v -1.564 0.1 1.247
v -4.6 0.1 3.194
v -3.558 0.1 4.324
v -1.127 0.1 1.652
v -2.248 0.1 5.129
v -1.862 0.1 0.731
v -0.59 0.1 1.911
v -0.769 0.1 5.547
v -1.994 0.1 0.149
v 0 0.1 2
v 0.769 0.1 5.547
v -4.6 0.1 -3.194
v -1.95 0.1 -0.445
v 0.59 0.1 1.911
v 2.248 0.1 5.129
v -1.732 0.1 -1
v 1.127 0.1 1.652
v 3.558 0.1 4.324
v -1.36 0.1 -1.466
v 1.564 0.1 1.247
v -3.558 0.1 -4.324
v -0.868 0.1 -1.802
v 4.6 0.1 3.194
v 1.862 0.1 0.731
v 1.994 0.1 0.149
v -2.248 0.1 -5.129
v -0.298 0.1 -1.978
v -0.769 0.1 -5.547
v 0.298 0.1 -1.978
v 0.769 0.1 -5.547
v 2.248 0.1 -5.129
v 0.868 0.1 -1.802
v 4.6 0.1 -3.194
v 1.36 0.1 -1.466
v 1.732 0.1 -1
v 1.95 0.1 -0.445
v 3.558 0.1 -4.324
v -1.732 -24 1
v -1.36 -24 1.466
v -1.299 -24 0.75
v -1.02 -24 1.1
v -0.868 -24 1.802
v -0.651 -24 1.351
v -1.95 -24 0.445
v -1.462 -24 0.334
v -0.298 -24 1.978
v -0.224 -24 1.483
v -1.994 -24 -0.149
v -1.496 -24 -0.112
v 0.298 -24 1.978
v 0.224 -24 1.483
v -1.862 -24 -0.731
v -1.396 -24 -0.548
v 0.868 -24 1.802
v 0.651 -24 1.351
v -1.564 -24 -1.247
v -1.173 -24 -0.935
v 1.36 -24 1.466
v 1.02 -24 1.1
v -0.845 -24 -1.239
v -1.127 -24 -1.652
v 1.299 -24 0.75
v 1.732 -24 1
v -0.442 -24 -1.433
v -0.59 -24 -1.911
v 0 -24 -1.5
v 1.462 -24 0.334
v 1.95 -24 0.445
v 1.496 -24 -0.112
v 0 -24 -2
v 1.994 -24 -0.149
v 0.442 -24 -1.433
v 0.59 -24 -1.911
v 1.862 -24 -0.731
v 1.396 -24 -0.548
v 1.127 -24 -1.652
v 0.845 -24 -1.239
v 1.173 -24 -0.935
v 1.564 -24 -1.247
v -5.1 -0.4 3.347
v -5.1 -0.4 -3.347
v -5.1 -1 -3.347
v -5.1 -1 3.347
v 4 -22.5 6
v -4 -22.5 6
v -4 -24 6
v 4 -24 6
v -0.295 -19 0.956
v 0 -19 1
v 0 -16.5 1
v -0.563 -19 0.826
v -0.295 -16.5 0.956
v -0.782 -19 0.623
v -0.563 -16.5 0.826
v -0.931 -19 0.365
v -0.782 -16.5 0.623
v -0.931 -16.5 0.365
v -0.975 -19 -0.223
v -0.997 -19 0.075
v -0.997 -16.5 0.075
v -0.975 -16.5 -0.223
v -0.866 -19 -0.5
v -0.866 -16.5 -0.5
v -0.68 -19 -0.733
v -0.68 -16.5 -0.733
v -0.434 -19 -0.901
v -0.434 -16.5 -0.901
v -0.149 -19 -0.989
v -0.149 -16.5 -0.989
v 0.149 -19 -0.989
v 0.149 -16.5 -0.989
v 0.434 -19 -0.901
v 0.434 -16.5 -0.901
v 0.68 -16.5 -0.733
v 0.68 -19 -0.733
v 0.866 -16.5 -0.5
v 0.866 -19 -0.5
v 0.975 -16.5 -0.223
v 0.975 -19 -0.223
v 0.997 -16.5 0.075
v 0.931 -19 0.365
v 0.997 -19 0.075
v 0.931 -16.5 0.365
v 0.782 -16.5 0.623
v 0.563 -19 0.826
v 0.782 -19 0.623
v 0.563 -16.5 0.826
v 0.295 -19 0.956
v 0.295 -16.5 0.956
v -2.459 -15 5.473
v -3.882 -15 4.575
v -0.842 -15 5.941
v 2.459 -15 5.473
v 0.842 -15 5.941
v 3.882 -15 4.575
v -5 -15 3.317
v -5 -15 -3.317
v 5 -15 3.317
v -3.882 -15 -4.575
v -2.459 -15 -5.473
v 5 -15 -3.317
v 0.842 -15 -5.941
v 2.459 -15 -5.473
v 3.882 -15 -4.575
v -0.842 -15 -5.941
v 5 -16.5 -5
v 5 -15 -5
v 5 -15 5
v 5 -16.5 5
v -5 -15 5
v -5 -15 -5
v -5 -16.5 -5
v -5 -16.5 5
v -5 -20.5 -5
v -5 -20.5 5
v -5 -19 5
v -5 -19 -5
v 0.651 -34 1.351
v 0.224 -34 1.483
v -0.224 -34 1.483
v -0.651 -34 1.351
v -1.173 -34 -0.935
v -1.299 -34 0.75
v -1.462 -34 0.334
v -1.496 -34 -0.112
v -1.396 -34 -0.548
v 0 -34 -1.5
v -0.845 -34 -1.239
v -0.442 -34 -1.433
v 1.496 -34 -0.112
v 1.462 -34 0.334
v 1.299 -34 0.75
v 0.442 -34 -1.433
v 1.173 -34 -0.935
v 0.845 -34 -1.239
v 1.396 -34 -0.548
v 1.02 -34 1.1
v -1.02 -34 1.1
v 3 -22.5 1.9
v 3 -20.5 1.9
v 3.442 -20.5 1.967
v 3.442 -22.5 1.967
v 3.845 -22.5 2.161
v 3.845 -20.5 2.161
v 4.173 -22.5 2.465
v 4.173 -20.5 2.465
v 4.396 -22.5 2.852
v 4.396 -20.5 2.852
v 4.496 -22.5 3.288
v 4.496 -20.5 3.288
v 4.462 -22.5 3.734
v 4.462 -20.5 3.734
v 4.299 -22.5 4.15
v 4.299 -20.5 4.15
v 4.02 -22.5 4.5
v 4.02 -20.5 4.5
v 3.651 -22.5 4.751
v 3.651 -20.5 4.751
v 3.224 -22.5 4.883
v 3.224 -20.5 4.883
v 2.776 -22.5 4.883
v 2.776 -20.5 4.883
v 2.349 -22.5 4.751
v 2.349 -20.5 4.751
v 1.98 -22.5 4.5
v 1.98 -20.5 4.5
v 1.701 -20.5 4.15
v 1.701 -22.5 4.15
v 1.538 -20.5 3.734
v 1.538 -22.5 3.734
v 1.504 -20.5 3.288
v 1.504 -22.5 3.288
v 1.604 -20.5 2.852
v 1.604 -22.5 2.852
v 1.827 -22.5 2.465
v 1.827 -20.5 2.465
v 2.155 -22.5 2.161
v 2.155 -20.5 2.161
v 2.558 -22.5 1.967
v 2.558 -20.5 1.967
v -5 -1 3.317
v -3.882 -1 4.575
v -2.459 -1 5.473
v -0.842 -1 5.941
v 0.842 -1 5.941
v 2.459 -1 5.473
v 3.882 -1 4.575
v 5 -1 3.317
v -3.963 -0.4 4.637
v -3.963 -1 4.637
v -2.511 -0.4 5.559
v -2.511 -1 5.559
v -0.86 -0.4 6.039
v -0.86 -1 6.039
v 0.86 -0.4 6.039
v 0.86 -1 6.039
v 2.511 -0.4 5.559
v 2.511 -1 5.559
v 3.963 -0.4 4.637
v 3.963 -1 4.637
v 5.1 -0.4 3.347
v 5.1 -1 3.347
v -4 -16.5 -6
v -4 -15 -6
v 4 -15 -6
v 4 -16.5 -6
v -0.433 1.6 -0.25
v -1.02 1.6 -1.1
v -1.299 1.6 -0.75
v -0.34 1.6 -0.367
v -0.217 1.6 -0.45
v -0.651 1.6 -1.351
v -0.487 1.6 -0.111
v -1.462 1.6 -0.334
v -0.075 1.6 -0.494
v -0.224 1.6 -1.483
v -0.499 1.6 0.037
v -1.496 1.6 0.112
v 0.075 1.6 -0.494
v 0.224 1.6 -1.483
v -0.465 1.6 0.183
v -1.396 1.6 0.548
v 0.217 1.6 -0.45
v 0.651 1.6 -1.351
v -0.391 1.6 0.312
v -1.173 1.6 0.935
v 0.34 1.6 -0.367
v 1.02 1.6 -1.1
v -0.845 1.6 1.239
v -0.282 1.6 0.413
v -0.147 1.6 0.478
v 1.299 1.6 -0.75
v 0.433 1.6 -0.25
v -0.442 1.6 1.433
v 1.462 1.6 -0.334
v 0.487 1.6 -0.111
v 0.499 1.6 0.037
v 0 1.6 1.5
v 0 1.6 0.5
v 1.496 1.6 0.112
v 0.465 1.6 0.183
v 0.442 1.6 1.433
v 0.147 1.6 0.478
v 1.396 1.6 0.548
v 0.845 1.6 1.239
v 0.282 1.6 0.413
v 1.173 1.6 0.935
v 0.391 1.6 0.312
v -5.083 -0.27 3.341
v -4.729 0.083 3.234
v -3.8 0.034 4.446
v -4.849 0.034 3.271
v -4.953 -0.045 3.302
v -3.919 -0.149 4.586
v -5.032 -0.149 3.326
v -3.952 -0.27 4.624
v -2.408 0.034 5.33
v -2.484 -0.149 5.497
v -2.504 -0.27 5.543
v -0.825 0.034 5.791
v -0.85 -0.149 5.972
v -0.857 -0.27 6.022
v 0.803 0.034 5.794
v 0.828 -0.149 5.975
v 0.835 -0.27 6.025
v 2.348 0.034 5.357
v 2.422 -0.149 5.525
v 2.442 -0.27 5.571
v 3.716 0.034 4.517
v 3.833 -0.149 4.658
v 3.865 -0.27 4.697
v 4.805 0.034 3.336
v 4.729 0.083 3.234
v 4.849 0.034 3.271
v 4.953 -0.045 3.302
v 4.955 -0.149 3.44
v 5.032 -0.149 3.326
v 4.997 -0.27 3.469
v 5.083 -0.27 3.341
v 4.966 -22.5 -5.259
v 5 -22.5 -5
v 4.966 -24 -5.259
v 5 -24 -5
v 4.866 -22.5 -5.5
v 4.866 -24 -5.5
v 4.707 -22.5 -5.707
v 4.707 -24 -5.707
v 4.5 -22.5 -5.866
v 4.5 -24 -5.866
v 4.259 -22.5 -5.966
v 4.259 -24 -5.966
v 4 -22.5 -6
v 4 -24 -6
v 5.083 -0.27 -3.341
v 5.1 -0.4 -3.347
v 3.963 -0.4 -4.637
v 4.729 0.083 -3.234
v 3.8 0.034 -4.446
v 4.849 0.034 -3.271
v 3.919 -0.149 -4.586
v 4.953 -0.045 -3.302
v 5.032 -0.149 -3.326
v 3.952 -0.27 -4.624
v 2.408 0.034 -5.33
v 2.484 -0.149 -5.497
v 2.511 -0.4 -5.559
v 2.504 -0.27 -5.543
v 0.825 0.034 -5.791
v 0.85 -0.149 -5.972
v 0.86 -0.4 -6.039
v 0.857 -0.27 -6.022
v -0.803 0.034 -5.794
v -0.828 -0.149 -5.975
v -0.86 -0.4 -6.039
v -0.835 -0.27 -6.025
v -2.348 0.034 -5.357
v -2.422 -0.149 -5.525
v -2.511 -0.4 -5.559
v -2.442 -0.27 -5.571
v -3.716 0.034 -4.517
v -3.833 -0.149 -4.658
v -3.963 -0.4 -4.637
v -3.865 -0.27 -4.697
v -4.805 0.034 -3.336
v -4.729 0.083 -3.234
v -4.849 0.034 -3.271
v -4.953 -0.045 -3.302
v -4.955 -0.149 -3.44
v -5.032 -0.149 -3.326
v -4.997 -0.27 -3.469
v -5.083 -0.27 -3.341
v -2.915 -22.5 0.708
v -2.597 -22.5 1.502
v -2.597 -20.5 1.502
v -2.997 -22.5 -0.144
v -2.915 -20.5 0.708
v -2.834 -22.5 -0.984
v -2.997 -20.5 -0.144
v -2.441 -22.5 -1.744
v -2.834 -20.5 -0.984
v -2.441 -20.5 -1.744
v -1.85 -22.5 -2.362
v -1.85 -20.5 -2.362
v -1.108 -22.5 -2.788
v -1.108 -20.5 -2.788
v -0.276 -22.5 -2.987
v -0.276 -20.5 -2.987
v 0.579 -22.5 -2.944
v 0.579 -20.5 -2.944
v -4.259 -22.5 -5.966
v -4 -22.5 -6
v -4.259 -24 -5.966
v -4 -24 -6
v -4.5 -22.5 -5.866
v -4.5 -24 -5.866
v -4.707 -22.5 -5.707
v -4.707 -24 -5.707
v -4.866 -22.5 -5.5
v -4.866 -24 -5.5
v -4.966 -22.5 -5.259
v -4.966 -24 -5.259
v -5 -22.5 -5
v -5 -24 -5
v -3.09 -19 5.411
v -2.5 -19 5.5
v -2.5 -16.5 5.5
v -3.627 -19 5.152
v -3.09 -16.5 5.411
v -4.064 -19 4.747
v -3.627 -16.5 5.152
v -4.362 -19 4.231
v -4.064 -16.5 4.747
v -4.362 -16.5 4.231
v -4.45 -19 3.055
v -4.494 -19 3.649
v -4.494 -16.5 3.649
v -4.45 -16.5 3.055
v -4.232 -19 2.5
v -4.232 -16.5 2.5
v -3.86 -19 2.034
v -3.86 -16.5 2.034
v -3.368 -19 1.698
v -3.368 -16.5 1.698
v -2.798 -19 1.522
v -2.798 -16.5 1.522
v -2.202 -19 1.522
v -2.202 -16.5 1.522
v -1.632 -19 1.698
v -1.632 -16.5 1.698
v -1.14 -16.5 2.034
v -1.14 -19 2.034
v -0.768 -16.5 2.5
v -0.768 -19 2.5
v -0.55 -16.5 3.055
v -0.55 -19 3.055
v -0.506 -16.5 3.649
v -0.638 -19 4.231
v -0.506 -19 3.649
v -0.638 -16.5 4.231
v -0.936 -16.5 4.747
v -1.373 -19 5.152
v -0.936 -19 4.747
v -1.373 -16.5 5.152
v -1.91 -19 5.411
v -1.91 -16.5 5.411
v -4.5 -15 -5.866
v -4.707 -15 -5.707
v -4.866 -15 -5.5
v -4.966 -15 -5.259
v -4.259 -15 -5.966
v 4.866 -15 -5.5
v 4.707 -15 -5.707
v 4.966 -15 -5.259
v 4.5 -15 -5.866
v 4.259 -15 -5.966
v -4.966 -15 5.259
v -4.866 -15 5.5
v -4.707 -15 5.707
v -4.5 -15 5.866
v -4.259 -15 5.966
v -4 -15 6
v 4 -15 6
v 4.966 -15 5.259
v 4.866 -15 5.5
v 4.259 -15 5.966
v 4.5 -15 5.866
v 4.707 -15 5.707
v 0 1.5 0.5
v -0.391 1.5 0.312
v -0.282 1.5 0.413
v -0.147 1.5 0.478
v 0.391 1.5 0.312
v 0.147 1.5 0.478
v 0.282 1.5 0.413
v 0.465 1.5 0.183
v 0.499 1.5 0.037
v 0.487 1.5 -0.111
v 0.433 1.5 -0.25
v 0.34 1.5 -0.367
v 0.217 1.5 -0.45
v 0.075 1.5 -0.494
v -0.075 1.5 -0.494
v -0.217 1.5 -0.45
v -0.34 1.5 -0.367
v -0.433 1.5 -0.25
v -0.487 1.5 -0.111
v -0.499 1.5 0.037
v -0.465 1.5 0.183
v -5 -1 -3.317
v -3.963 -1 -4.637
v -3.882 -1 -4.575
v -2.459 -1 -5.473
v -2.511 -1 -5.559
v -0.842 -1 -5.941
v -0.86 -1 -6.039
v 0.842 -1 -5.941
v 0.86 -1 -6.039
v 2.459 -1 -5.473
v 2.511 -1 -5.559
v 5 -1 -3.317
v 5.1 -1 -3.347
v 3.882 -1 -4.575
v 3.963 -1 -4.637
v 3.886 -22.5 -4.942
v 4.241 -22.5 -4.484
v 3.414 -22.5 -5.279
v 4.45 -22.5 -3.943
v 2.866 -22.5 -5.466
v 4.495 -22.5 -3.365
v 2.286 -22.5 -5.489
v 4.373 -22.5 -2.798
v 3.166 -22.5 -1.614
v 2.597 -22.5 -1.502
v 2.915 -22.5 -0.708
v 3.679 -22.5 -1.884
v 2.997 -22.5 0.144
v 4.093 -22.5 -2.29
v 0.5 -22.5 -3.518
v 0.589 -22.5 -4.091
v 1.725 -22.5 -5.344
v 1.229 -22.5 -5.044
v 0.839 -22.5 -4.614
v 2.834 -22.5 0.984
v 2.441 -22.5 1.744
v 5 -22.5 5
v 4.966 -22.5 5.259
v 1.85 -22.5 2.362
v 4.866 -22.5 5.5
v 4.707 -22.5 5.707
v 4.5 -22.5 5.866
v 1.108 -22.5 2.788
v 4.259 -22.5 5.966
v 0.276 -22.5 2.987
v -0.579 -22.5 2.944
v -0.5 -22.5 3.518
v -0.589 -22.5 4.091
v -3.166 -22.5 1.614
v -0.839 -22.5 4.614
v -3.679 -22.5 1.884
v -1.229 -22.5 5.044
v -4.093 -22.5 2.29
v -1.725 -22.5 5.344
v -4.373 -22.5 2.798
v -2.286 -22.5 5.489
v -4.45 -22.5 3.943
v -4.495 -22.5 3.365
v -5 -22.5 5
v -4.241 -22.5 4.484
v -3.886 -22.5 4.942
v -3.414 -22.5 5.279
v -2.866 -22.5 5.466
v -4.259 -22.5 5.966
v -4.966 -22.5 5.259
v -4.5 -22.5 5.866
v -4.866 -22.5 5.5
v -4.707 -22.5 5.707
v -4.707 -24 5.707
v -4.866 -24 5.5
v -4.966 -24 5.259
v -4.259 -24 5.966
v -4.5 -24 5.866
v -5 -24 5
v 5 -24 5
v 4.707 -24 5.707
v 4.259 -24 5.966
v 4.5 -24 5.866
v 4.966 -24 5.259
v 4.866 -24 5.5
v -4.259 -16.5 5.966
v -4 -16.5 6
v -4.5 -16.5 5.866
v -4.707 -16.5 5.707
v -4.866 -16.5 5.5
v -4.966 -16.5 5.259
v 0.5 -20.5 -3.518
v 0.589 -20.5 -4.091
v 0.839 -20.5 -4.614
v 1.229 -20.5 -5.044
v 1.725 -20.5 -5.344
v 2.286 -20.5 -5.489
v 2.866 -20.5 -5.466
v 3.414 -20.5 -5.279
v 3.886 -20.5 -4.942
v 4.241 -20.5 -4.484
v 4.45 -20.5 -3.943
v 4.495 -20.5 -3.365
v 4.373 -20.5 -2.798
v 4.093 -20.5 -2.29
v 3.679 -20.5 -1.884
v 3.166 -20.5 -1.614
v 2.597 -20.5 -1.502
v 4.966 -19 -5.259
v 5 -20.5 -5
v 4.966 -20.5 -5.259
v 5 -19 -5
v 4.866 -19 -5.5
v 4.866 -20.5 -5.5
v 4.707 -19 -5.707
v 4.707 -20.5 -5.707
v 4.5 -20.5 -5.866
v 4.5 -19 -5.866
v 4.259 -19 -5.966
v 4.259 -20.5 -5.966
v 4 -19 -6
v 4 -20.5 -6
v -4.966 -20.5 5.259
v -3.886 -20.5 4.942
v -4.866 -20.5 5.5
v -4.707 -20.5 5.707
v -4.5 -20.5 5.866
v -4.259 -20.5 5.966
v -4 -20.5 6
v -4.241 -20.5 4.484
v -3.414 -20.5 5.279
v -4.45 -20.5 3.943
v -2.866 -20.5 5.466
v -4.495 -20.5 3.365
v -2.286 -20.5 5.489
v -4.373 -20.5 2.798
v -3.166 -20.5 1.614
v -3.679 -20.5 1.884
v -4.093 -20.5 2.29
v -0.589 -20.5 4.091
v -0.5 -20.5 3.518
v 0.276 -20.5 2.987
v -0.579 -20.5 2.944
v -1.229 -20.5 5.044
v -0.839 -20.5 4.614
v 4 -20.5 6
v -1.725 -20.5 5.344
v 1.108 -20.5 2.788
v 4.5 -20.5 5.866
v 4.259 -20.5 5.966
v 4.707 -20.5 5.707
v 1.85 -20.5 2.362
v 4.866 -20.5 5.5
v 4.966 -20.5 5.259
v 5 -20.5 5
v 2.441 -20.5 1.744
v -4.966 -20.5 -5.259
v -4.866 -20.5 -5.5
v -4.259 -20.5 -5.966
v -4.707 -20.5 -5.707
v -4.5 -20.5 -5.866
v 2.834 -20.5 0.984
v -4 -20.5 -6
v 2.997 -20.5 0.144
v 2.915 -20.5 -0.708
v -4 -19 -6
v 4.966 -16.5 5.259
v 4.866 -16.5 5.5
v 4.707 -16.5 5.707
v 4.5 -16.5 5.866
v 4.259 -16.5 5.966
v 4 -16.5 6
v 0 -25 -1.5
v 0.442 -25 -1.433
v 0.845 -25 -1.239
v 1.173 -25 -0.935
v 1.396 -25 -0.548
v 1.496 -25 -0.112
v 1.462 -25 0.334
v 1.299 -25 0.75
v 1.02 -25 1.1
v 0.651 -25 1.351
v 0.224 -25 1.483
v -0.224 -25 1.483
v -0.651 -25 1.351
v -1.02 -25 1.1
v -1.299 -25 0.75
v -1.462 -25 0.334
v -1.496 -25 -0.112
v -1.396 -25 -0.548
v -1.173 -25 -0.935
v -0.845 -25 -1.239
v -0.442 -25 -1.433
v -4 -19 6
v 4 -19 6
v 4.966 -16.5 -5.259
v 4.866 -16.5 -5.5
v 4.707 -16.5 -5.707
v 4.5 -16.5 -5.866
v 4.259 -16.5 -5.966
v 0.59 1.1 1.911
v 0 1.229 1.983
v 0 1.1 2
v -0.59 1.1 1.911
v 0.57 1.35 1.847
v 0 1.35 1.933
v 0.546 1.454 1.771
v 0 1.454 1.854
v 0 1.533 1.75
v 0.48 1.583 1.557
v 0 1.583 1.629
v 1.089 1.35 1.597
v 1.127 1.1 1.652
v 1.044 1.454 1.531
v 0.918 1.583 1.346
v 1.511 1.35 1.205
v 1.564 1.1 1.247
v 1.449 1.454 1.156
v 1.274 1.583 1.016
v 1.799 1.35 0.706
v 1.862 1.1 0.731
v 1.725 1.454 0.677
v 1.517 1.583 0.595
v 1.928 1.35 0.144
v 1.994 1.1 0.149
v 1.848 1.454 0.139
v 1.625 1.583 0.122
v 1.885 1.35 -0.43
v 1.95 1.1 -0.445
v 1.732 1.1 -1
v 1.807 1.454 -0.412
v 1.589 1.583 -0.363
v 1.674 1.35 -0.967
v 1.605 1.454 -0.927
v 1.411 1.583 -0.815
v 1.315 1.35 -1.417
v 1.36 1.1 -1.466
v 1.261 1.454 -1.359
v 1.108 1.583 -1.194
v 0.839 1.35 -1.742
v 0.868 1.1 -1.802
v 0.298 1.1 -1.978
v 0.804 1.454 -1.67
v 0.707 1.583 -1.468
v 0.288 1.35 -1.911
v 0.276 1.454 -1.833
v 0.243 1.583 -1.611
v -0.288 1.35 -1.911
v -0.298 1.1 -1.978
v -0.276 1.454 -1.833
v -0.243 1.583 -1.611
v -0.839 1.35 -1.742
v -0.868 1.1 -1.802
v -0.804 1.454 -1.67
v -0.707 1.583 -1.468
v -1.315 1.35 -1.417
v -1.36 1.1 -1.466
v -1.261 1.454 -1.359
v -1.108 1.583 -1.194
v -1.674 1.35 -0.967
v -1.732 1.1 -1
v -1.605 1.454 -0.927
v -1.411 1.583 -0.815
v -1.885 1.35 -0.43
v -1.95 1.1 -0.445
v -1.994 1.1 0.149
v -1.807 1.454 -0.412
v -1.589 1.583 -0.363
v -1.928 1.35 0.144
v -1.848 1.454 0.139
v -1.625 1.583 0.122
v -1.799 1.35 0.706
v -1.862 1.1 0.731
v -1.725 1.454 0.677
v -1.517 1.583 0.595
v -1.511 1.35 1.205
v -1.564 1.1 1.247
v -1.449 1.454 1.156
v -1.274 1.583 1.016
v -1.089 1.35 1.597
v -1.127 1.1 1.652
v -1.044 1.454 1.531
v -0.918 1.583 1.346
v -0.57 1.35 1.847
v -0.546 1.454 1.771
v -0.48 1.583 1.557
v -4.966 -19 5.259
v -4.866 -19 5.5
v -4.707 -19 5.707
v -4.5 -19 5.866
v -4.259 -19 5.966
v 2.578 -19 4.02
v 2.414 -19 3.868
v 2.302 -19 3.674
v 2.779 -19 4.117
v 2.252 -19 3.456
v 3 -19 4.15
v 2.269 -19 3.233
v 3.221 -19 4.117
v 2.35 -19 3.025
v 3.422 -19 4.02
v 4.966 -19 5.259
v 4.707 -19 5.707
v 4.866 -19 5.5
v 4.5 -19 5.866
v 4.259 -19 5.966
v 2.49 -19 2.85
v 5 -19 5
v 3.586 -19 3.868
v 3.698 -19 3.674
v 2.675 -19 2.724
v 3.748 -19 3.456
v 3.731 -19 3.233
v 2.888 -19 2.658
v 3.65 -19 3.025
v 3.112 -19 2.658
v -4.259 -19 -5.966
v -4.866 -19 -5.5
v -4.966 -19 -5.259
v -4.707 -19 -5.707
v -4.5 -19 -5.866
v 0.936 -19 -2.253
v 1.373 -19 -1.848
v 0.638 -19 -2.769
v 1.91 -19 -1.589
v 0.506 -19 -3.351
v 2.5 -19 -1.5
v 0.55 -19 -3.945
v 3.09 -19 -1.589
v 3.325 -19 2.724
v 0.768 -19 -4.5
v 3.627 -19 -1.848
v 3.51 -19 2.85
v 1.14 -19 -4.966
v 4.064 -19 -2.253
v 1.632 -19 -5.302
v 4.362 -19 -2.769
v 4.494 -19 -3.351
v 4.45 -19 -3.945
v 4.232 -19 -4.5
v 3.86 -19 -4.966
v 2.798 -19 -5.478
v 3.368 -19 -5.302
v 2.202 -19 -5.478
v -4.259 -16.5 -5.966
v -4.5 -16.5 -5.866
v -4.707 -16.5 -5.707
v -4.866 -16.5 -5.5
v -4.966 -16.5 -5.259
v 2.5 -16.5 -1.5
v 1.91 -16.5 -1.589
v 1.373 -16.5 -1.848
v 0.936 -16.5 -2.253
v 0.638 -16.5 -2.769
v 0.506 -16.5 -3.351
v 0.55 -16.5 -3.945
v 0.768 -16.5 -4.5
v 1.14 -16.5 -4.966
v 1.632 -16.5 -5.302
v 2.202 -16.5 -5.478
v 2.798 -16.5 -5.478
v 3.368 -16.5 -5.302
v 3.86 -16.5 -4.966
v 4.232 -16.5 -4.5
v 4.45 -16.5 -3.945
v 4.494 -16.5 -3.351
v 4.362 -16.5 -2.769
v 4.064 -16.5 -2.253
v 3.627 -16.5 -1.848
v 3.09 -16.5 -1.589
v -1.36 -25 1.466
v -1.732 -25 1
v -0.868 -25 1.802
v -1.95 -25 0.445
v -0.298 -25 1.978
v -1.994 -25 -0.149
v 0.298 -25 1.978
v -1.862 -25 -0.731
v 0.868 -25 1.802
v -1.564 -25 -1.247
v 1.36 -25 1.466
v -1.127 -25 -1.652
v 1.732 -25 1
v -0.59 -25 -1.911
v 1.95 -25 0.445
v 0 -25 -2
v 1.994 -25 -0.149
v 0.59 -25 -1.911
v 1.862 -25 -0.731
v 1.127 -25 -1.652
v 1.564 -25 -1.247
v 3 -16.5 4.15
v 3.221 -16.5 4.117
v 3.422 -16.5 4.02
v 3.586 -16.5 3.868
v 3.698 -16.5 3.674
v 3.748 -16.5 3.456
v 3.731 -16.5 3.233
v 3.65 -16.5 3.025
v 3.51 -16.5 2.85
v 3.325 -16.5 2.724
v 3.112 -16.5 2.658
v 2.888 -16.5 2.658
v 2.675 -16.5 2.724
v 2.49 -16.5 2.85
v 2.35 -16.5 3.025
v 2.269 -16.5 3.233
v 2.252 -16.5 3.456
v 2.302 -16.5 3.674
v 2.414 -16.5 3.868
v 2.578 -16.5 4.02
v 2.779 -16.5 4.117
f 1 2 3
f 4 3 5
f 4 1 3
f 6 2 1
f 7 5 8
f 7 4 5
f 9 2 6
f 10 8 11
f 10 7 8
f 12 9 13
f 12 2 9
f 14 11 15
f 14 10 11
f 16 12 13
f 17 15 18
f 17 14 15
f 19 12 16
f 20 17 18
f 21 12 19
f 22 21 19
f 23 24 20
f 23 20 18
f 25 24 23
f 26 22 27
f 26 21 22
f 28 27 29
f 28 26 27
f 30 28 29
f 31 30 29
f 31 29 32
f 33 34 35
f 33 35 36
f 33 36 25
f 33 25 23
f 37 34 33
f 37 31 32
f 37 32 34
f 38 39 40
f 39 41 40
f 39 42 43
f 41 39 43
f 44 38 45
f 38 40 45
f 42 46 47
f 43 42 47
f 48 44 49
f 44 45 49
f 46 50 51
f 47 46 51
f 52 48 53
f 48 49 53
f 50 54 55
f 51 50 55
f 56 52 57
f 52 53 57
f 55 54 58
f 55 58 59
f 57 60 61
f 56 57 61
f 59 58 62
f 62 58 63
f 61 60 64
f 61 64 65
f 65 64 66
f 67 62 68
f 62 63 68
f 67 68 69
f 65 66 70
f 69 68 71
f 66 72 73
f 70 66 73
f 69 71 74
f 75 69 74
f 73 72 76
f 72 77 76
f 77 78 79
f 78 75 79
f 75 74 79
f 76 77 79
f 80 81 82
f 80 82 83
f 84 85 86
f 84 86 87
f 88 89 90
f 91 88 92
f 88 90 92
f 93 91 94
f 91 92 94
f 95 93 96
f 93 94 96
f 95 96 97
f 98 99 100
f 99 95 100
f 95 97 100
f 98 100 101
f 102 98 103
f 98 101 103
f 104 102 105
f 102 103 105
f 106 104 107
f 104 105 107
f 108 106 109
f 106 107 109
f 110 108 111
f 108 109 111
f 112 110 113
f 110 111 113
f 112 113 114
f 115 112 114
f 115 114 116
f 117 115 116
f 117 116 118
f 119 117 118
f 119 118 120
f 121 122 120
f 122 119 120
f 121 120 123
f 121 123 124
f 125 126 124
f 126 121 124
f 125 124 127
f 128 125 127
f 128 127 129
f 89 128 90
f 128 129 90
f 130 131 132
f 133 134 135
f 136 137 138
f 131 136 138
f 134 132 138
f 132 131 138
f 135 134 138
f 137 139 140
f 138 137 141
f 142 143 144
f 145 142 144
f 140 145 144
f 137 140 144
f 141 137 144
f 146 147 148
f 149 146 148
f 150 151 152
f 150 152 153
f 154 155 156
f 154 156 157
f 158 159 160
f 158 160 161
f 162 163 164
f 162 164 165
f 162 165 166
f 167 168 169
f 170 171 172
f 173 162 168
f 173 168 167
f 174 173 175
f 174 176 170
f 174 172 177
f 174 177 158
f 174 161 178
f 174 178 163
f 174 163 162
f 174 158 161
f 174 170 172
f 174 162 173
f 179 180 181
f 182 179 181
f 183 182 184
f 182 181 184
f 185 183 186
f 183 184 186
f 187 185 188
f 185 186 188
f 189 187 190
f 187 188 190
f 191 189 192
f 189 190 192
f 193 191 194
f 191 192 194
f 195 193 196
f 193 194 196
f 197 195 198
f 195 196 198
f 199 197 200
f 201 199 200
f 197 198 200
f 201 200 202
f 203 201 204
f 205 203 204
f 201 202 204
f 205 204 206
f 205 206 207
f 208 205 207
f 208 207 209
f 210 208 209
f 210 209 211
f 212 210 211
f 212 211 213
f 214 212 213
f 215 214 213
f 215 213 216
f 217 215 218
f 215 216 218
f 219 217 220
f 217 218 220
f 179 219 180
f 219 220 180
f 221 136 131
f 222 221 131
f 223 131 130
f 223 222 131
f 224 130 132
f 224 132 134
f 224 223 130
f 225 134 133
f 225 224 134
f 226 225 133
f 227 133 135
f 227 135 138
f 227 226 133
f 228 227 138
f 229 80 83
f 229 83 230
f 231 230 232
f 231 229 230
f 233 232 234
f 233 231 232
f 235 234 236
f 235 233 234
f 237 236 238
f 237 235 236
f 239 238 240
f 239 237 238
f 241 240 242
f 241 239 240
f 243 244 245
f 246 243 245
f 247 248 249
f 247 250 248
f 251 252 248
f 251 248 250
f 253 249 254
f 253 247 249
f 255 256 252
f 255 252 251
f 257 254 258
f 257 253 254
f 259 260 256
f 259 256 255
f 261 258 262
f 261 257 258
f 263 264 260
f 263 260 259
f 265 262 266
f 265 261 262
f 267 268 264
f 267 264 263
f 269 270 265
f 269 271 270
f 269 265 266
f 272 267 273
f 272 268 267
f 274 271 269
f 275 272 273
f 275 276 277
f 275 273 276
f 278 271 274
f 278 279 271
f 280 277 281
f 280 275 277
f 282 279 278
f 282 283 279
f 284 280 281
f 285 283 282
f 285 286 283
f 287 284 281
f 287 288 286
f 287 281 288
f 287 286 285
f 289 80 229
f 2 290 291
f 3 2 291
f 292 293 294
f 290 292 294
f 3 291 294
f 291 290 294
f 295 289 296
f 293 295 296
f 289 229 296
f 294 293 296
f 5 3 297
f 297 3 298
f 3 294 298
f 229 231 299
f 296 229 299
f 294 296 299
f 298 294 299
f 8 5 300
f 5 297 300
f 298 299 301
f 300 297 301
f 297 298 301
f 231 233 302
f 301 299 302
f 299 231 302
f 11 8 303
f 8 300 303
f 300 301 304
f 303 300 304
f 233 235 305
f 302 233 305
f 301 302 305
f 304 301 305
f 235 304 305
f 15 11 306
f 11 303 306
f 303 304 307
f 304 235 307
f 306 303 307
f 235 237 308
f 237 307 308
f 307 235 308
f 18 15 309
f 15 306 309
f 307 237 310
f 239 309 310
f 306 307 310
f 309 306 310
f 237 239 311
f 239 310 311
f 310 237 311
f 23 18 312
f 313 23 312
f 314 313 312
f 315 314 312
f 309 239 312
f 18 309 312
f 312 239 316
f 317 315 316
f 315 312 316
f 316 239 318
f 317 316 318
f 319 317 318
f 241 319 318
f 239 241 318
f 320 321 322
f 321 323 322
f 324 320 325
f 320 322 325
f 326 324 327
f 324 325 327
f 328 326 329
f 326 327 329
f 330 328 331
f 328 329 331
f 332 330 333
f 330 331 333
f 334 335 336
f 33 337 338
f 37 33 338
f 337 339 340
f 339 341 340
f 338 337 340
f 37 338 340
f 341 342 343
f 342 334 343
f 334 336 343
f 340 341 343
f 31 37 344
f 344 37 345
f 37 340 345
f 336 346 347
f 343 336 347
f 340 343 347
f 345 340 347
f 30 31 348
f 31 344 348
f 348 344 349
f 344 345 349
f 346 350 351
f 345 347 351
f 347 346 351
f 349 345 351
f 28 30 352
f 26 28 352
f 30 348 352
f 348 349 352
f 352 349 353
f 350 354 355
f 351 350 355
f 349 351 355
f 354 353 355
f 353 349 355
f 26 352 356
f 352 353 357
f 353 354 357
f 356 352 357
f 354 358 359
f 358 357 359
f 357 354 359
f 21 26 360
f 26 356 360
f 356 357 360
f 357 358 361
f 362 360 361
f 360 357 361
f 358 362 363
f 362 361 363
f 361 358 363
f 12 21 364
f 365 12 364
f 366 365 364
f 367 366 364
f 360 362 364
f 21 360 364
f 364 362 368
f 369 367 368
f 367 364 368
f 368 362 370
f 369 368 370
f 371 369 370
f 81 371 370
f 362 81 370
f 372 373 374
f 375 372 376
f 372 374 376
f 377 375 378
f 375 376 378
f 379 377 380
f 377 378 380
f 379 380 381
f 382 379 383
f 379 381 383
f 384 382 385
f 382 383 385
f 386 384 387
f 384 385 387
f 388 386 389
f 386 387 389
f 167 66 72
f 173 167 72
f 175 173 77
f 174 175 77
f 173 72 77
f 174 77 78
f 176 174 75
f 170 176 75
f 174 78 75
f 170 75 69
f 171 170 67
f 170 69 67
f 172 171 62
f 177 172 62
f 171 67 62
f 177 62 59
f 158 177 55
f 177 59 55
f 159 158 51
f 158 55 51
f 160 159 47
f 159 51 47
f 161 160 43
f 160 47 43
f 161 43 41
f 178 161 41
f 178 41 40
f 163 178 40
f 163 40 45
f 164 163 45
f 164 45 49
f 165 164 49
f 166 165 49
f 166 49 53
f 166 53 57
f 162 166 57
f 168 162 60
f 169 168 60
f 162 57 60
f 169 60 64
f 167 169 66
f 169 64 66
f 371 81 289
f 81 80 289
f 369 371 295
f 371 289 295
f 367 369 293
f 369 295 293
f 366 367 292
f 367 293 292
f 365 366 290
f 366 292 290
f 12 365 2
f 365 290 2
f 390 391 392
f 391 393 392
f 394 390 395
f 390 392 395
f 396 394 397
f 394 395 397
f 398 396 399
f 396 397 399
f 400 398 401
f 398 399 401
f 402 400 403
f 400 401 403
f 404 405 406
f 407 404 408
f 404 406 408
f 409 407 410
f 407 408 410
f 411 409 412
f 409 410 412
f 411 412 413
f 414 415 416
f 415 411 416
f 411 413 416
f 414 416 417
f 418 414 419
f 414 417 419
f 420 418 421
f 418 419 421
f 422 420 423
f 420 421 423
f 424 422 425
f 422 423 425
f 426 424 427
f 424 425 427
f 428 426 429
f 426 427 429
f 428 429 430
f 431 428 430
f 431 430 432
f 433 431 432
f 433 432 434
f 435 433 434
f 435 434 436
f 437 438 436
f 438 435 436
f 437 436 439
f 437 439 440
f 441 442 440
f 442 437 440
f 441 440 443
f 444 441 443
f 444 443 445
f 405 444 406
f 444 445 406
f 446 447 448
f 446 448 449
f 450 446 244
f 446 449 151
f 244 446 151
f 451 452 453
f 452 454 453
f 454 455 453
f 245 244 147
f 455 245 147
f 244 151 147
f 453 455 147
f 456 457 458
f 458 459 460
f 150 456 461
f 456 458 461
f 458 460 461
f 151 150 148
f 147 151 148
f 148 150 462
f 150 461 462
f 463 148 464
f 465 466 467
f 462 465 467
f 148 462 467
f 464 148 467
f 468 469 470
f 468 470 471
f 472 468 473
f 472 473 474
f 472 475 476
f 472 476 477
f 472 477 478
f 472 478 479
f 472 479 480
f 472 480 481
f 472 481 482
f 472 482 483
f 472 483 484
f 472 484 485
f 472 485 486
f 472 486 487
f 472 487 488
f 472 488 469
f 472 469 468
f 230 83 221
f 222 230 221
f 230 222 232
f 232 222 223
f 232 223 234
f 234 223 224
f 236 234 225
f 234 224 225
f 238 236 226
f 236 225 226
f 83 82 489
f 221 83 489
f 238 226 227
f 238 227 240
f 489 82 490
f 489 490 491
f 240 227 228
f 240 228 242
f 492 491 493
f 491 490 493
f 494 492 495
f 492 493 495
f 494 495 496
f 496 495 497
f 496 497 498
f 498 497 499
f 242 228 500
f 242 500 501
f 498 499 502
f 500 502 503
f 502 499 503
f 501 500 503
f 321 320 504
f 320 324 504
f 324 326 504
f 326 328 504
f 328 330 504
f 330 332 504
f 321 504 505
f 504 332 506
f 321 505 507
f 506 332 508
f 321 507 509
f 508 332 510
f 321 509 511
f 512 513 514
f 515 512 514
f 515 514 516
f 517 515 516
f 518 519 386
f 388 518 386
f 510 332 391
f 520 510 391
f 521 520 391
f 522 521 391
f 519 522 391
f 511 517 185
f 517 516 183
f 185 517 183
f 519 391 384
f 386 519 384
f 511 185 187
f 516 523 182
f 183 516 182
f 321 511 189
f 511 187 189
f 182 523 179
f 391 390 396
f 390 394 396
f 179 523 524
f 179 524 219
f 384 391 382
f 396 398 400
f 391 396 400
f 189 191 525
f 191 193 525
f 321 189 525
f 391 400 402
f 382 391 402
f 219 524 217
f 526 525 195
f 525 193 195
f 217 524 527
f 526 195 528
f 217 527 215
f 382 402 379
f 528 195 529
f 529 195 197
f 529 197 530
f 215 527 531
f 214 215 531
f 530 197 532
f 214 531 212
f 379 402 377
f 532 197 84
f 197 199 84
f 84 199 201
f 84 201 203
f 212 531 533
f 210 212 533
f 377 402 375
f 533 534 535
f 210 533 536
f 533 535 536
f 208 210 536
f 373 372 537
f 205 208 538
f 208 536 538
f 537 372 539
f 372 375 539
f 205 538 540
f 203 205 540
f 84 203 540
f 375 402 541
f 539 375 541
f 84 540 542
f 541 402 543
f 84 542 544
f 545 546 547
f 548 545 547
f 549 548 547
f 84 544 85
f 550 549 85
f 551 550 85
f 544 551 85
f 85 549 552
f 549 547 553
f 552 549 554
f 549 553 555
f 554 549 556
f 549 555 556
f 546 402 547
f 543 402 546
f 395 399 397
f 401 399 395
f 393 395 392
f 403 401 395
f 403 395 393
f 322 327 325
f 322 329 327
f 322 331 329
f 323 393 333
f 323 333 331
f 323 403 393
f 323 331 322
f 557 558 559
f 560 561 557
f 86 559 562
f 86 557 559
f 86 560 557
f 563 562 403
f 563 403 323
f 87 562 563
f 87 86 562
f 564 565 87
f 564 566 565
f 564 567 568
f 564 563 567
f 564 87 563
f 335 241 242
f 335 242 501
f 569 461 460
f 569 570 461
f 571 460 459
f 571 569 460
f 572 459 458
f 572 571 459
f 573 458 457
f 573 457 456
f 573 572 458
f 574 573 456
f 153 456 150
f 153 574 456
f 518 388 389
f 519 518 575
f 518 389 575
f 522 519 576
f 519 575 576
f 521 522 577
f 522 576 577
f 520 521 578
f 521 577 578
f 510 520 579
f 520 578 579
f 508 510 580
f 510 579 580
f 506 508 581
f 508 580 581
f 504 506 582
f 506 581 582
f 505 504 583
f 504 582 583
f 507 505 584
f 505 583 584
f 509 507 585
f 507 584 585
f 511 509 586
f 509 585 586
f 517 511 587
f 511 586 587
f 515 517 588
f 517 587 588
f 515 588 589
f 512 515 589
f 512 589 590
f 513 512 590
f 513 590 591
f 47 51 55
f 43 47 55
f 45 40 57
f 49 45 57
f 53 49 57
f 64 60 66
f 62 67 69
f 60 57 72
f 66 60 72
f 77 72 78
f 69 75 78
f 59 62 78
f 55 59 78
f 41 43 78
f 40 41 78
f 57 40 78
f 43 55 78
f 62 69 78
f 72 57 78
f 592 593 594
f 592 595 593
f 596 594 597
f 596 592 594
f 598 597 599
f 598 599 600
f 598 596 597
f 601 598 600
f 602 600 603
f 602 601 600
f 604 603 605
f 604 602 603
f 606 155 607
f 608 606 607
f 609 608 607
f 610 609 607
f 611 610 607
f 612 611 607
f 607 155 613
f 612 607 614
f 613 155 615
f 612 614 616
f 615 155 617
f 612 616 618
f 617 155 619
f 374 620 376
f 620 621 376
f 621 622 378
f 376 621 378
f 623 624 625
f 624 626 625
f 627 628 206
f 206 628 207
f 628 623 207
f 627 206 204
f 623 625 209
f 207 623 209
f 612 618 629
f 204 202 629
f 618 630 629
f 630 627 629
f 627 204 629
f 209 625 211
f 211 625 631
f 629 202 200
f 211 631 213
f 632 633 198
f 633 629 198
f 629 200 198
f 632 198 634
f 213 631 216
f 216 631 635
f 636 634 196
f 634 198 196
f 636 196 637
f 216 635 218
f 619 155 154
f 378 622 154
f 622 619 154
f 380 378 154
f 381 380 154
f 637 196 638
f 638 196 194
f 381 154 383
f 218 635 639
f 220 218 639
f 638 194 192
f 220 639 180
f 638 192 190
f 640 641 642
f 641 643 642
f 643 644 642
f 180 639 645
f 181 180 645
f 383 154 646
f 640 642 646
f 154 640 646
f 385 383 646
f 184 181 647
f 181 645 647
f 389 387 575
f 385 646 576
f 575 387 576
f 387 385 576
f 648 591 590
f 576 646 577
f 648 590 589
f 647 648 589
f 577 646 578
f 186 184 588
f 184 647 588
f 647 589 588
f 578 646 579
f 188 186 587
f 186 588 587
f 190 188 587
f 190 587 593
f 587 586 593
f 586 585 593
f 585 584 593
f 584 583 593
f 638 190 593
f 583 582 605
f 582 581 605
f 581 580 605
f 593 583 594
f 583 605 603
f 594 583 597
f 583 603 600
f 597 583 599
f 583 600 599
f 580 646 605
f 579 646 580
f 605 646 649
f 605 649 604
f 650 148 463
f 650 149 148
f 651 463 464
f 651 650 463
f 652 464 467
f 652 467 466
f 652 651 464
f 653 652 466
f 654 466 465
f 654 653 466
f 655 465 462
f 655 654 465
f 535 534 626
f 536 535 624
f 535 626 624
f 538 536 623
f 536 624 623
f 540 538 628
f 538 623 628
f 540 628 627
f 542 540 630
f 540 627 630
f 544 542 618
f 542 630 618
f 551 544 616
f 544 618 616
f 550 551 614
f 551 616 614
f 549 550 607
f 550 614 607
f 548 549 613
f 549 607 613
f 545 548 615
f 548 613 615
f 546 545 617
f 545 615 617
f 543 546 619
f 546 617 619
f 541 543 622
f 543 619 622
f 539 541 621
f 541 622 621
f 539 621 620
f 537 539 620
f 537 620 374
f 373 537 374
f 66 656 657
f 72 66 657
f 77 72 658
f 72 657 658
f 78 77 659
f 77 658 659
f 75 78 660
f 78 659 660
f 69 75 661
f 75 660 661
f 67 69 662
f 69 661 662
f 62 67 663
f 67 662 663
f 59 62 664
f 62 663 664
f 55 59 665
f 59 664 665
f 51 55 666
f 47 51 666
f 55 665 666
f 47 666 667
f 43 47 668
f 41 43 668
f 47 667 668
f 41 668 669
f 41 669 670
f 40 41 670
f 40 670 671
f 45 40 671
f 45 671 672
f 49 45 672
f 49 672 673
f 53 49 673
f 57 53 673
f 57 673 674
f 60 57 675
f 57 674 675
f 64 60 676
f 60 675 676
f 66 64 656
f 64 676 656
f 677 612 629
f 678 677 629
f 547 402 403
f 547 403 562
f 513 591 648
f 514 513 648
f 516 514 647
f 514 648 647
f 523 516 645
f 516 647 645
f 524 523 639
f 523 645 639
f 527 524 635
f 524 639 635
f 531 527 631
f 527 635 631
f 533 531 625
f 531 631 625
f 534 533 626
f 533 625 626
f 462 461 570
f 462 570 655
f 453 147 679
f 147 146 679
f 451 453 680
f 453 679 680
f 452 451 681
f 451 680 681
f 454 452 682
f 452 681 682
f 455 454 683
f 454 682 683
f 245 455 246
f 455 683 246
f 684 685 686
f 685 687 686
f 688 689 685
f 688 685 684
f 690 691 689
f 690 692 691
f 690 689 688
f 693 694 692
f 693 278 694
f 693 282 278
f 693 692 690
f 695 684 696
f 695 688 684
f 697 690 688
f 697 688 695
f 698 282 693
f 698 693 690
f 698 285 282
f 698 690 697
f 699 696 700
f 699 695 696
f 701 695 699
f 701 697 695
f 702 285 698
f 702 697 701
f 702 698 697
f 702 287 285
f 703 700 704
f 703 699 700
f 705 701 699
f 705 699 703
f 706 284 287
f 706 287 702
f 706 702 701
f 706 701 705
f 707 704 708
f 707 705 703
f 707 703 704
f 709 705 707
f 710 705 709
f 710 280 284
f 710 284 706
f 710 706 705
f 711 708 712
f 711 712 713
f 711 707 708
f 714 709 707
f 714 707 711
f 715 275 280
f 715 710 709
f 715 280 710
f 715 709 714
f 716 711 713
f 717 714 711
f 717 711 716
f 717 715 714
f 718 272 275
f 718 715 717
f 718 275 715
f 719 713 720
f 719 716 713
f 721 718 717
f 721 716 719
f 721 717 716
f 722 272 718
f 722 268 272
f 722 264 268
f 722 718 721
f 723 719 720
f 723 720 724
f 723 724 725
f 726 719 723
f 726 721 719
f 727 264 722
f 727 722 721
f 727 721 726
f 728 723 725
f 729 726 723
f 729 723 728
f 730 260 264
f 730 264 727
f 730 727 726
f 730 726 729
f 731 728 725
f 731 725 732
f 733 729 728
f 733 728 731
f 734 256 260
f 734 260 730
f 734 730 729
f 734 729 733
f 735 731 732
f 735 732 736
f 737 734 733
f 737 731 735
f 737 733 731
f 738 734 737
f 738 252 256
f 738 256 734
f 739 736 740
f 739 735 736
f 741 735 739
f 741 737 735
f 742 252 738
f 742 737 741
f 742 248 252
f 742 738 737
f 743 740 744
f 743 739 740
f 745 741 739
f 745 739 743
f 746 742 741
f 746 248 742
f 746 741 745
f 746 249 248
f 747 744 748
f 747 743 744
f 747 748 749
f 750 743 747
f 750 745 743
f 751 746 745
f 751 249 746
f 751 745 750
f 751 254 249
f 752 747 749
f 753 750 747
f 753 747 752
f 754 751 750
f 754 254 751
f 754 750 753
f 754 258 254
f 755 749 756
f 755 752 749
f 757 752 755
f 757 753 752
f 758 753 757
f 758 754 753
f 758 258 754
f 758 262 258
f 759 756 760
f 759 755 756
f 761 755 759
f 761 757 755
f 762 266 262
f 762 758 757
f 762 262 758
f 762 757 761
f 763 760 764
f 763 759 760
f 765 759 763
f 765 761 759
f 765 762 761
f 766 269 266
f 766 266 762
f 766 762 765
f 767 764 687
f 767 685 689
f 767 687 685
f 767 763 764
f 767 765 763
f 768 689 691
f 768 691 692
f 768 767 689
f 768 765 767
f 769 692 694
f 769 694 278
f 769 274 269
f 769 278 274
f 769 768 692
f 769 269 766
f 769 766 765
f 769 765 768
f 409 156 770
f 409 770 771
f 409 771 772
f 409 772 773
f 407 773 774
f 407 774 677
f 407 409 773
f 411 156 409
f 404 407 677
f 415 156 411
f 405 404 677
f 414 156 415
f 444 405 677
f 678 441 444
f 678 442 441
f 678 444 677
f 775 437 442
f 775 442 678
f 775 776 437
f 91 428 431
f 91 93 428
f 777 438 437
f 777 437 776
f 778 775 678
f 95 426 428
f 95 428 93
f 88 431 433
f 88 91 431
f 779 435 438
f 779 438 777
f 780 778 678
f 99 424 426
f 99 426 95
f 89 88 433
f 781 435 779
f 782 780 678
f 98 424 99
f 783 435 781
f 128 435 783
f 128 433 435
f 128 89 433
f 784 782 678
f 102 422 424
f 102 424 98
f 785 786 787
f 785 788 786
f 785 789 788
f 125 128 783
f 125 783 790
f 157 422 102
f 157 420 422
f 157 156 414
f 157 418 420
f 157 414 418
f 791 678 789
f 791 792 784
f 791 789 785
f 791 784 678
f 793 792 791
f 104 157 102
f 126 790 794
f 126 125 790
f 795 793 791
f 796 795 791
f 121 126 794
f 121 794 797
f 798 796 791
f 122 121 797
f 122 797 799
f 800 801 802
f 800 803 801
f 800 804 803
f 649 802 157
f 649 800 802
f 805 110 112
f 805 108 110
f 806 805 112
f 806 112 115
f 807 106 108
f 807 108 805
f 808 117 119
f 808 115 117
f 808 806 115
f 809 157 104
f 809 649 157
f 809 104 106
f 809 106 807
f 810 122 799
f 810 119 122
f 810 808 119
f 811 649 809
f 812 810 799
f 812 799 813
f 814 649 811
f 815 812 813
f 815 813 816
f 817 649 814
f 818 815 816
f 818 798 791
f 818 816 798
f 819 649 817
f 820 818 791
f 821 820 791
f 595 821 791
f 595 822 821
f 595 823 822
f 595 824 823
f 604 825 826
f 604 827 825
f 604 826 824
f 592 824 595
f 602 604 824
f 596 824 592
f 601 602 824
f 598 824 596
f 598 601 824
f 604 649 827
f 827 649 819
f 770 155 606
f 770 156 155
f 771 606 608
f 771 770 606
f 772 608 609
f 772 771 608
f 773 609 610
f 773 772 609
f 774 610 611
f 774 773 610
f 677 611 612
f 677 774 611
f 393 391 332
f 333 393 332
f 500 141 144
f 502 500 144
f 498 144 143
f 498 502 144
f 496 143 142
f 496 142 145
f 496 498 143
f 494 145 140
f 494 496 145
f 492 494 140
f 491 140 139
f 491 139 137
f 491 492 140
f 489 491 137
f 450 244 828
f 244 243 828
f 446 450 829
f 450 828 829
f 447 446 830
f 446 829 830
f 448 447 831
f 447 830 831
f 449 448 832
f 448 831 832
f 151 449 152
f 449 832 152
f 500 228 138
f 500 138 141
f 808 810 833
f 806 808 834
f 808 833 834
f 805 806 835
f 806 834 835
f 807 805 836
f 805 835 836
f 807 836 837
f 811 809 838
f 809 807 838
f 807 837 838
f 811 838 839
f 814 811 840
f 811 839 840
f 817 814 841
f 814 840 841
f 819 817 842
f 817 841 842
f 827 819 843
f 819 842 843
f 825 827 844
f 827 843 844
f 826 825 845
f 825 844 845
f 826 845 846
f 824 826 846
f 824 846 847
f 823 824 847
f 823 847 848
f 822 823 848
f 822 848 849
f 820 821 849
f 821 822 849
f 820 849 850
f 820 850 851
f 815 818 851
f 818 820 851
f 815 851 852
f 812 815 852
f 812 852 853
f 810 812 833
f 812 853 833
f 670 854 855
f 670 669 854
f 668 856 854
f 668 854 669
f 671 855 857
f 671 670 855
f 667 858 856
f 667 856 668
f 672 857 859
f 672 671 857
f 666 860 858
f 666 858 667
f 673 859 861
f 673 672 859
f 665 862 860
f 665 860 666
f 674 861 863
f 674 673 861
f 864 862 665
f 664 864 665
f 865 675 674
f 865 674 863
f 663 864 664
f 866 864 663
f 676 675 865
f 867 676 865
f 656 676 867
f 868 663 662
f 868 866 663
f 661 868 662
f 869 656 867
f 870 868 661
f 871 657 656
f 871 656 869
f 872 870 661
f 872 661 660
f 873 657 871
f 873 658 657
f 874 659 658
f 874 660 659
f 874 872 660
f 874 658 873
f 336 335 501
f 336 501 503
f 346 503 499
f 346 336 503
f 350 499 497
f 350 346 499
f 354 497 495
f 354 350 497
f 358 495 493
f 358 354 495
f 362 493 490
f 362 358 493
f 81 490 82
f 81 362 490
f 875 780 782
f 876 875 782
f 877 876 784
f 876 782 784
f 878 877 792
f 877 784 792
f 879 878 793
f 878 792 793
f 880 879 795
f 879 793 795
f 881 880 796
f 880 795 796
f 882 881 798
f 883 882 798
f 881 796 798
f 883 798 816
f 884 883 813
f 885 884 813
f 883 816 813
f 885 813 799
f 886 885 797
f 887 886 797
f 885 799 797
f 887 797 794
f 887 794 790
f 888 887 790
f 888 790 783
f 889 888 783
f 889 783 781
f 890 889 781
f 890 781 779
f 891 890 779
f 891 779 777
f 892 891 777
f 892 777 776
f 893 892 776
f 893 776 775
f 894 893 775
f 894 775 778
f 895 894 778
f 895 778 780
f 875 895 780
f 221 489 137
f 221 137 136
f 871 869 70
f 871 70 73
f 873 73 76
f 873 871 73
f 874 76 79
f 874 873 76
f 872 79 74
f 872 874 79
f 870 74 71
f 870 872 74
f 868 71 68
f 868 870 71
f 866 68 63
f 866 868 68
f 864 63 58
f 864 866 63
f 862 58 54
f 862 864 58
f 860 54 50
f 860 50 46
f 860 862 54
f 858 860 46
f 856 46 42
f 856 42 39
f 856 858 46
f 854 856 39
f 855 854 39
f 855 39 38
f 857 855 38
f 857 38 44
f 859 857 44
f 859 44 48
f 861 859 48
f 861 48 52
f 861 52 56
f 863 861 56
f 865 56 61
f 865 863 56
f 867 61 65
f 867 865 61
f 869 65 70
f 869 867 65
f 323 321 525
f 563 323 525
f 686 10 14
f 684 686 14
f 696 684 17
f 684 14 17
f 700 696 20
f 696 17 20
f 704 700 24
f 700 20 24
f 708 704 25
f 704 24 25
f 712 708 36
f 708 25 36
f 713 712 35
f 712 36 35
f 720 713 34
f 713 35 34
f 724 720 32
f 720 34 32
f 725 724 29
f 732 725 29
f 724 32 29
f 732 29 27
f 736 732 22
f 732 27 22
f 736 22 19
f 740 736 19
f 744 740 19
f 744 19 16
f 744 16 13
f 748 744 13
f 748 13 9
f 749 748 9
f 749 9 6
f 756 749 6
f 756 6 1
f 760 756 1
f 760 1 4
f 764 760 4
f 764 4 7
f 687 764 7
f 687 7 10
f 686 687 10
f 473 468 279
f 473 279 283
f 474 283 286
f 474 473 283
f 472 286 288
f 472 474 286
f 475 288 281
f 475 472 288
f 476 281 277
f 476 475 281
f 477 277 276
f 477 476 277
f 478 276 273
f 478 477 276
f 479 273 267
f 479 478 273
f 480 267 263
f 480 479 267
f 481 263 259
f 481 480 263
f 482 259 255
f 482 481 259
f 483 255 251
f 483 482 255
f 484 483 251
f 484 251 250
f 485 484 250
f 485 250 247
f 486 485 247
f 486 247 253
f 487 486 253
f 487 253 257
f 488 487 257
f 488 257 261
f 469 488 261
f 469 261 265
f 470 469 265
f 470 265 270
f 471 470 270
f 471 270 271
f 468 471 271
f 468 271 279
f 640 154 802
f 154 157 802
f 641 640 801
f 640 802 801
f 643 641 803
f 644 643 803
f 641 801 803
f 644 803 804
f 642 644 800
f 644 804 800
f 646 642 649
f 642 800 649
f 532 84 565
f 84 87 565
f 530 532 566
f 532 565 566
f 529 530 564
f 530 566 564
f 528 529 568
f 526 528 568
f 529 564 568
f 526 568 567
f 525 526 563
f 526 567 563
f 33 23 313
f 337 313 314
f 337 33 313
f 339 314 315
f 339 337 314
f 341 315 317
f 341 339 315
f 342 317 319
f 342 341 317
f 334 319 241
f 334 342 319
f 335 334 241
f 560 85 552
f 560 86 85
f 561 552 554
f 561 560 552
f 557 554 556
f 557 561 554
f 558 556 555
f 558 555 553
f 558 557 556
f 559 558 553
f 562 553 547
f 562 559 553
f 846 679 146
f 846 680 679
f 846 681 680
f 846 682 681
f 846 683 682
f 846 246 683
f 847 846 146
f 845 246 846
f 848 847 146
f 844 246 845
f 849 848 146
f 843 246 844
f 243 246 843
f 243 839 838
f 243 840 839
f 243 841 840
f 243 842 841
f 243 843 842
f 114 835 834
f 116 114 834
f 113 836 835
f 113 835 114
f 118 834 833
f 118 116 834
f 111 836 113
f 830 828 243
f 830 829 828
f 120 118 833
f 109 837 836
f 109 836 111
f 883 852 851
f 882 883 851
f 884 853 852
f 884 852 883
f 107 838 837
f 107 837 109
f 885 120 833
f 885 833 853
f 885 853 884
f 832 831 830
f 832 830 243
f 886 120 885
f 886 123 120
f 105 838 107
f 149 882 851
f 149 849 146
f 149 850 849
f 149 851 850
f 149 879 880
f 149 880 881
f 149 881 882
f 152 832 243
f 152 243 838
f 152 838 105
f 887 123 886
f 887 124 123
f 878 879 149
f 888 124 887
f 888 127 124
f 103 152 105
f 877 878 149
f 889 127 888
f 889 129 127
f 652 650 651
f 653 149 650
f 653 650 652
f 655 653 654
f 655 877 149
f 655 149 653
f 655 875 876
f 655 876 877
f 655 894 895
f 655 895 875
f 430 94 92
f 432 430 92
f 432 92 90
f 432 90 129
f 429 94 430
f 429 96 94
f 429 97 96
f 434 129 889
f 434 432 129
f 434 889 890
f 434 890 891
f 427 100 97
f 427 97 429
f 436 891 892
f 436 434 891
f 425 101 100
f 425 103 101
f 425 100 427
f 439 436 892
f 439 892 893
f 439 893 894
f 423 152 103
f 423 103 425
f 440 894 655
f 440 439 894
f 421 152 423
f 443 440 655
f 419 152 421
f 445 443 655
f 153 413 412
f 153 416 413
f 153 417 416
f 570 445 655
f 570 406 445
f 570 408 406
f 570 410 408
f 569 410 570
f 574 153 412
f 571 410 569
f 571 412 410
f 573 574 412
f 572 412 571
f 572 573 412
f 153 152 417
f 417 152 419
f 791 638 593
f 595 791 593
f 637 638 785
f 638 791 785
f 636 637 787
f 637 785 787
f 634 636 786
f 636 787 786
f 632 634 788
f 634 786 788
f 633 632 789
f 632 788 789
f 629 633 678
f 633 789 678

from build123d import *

# Parameters (mm, degrees)
EXTRUDE_1_DEPTH     = 15
SKETCH_2_R          = 2
SKETCH_2_R_2        = 0.5
EXTRUDE_2_DEPTH     = 1.6
SKETCH_3_R          = 0.5
EXTRUDE_3_DEPTH     = 1.5
SKETCH_4_W          = 10
SKETCH_4_H          = 12
EXTRUDE_4_DEPTH     = 9
SKETCH_5_R          = 1.5
EXTRUDE_5_DEPTH     = 10
EXTRUDE_START       = 1
SKETCH_6_R          = 2
SKETCH_6_R_2        = 1.5
EXTRUDE_6_DEPTH     = 1
SKETCH_7_W          = 12
SKETCH_7_H          = 6
CUT_EXTRUDE_1_DEPTH = 20
SKETCH_8_R          = 1
SKETCH_8_R_2        = 2
EXTRUDE_7_DEPTH     = 7
SKETCH_10_R         = 3
SKETCH_10_R_2       = 1.5
EXTRUDE_8_DEPTH     = 2
SKETCH_11_R         = 0.75
EXTRUDE_9_DEPTH     = 4
EXTRUDE_10_DEPTH    = 1
EXTRUDE_START_2     = 0.1
EXTRUDE_11_DEPTH    = 0.1
FILLET_1_R          = 0.5
FILLET_2_R          = 0.5
SKETCH_14_W         = 10
SKETCH_14_H         = 12
EXTRUDE_12_DEPTH    = 1.5
FILLET_3_R          = 1


with BuildPart() as part:
    # 草图1 → 凸台-拉伸1 (new body)
    with BuildSketch(Plane(origin=(0, 0, 0), x_dir=(1, 0, 0), z_dir=(0, 1, 0))):
        with BuildLine():
            Line((-5, 3.31662479), (-5, -3.31662479))
            ThreePointArc((-5, -3.31662479), (0, -6), (5, -3.31662479))
            Line((5, -3.31662479), (5, 3.31662479))
            ThreePointArc((5, 3.31662479), (0, 6), (-5, 3.31662479))
        make_face()
    extrude(amount=-EXTRUDE_1_DEPTH)

    # 草图2 → 凸台-拉伸2 (add)
    with BuildSketch(Plane(origin=(0, 0, 0), x_dir=(1, 0, 0), z_dir=(0, 1, 0))):
        with Locations(Location((0, 0, 0), (0, 0, 270))):
            Circle(SKETCH_2_R)
        with Locations(Location((0, 0, 0), (0, 0, 270))):
            Circle(SKETCH_2_R_2, mode=Mode.SUBTRACT)
    extrude(amount=EXTRUDE_2_DEPTH)

    # 草图3 → 凸台-拉伸3 (add)
    with BuildSketch(Plane(origin=(0, 0, 0), x_dir=(1, 0, 0), z_dir=(0, 1, 0))):
        with Locations(Location((0, 0, 0), (0, 0, 270))):
            Circle(SKETCH_3_R)
    extrude(amount=EXTRUDE_3_DEPTH)

    # 草图12 → 凸台-拉伸10 (add)
    with BuildSketch(Plane(origin=(0, 0, 0), x_dir=(1, 0, 0), z_dir=(0, 1, 0))):
        with BuildLine():
            Line((-5.1, 3.346640106), (-5.1, -3.346640106))
            ThreePointArc((-5.1, -3.346640106), (0, -6.1), (5.1, -3.346640106))
            Line((5.1, -3.346640106), (5.1, 3.346640106))
            ThreePointArc((5.1, 3.346640106), (0, 6.1), (-5.1, 3.346640106))
        make_face()
        with BuildLine():
            Line((-5, 3.31662479), (-5, -3.31662479))
            ThreePointArc((-5, -3.31662479), (0, -6), (5, -3.31662479))
            Line((5, -3.31662479), (5, 3.31662479))
            ThreePointArc((5, 3.31662479), (0, 6), (-5, 3.31662479))
        make_face(mode=Mode.SUBTRACT)
    extrude(amount=-EXTRUDE_10_DEPTH)

    # 草图13 → 凸台-拉伸11 (add)
    with BuildSketch(Plane(origin=(0, 0, 0), x_dir=(1, 0, 0), z_dir=(0, 1, 0)).offset(EXTRUDE_START_2)):
        with BuildLine():
            Line((-5.1, 3.346640106), (-5.1, -3.346640106))
            ThreePointArc((-5.1, -3.346640106), (0, -6.1), (5.1, -3.346640106))
            Line((5.1, -3.346640106), (5.1, 3.346640106))
            ThreePointArc((5.1, 3.346640106), (0, 6.1), (-5.1, 3.346640106))
        make_face()
    extrude(amount=-EXTRUDE_11_DEPTH)

    # 圆角1
    fillet_1_edges = [part.edges().sort_by_distance(p)[0] for p in [
        (0, 0.1, -6.1),
        (-5.1, 0.1, 0),
        (0, 0.1, 6.1),
        (5.1, 0.1, 0),
    ]]
    fillet(fillet_1_edges, radius=FILLET_1_R)

    # 圆角2
    fillet_2_edges = [part.edges().sort_by_distance(p)[0] for p in [
        (0, 1.6, -2),
    ]]
    fillet(fillet_2_edges, radius=FILLET_2_R)


with BuildPart() as body_2:
    # 草图4 → 凸台-拉伸4 (new body)
    with BuildSketch(Plane.XZ.offset(15)):
        Rectangle(SKETCH_4_W, SKETCH_4_H)
    extrude(amount=EXTRUDE_4_DEPTH)

    # 草图7 → 切除-拉伸1 (cut)
    with BuildSketch(Plane.ZY.offset(5)):
        with Locations((0, -19.5)):
            Rectangle(SKETCH_7_W, SKETCH_7_H)
    extrude(amount=-CUT_EXTRUDE_1_DEPTH, mode=Mode.SUBTRACT)


with BuildPart() as body_3:
    # 草图5 → 凸台-拉伸5 (new body)
    with BuildSketch(Plane.XZ.offset(24)):
        with Locations(Location((0, 0, 0), (0, 0, 270))):
            Circle(SKETCH_5_R)
    extrude(amount=EXTRUDE_5_DEPTH)


with BuildPart() as body_4:
    # 草图6 → 凸台-拉伸6 (new body)
    with BuildSketch(Plane.XZ.offset(24).offset(EXTRUDE_START)):
        with Locations(Location((0, 0, 0), (0, 0, 270))):
            Circle(SKETCH_6_R)
        with Locations(Location((0, 0, 0), (0, 0, 270))):
            Circle(SKETCH_6_R_2, mode=Mode.SUBTRACT)
    extrude(amount=-EXTRUDE_6_DEPTH)


with BuildPart() as cut_extrude_1_piece_1:
    # of the separate pieces the step leaves, piece 1, a body of its own (cut_extrude_1_pieces)
    add(body_2.part.solids().sort_by_distance((5, -15, -6))[0])

    # 草图8 → 凸台-拉伸7 (add)
    with BuildSketch(Plane.XZ.offset(16.5)):
        with Locations(Location((0, 0, 0), (0, 0, 90))):
            Circle(SKETCH_8_R)
        with Locations(Location((2.5, -3.5, 0), (0, 0, 90))):
            Circle(SKETCH_8_R_2)
        with Locations(Location((-2.5, 3.5, 0), (0, 0, 90))):
            Circle(SKETCH_8_R_2)
    extrude(amount=EXTRUDE_7_DEPTH)



with BuildPart() as cut_extrude_1_piece_2:
    # of the separate pieces the step leaves, piece 2, a body of its own (cut_extrude_1_pieces)
    add(body_2.part.solids().sort_by_distance((-5, -22.5, -6))[0])


with BuildPart() as cut_extrude_1_piece_1_1:
    add(cut_extrude_1_piece_1.part)

    add(cut_extrude_1_piece_2.part)  # 凸台-拉伸8 merges 切除-拉伸1 piece 2
    # 草图10 → 凸台-拉伸8 (add)
    with BuildSketch(Plane(origin=(0, -20.5, 0), x_dir=(-1, 0, 0), z_dir=(0, -1, 0))):
        Circle(SKETCH_10_R)
        with Locations(Location((-3, -3.4, 0), (0, 0, 90))):
            Circle(SKETCH_10_R_2)
    extrude(amount=EXTRUDE_8_DEPTH)

    # 草图11 → 凸台-拉伸9 (add)
    with BuildSketch(Plane(origin=(0, -20.5, 0), x_dir=(1, 0, 0), z_dir=(0, 1, 0))):
        with Locations(Location((3, -3.4, 0), (0, 0, 270))):
            Circle(SKETCH_11_R)
    extrude(amount=EXTRUDE_9_DEPTH)

    # 草图14 → 凸台-拉伸12 (add)
    with BuildSketch(Plane(origin=(0, -20.5, 0), x_dir=(1, 0, 0), z_dir=(0, 1, 0))):
        Rectangle(SKETCH_14_W, SKETCH_14_H)
    extrude(amount=EXTRUDE_12_DEPTH)

    # 圆角3
    fillet_3_edges = [cut_extrude_1_piece_1_1.edges().sort_by_distance(p)[0] for p in [
        (-5, -15.75, 6),
        (-5, -15.75, -6),
        (5, -15.75, -6),
        (5, -15.75, 6),
        (-5, -23.25, 6),
        (5, -23.25, 6),
        (5, -23.25, -6),
        (-5, -23.25, -6),
        (5, -19.75, 6),
        (5, -19.75, -6),
        (-5, -19.75, -6),
        (-5, -19.75, 6),
    ]]
    fillet(fillet_3_edges, radius=FILLET_3_R)


solid = Compound([part.part, body_3.part, body_4.part, cut_extrude_1_piece_1_1.part])
